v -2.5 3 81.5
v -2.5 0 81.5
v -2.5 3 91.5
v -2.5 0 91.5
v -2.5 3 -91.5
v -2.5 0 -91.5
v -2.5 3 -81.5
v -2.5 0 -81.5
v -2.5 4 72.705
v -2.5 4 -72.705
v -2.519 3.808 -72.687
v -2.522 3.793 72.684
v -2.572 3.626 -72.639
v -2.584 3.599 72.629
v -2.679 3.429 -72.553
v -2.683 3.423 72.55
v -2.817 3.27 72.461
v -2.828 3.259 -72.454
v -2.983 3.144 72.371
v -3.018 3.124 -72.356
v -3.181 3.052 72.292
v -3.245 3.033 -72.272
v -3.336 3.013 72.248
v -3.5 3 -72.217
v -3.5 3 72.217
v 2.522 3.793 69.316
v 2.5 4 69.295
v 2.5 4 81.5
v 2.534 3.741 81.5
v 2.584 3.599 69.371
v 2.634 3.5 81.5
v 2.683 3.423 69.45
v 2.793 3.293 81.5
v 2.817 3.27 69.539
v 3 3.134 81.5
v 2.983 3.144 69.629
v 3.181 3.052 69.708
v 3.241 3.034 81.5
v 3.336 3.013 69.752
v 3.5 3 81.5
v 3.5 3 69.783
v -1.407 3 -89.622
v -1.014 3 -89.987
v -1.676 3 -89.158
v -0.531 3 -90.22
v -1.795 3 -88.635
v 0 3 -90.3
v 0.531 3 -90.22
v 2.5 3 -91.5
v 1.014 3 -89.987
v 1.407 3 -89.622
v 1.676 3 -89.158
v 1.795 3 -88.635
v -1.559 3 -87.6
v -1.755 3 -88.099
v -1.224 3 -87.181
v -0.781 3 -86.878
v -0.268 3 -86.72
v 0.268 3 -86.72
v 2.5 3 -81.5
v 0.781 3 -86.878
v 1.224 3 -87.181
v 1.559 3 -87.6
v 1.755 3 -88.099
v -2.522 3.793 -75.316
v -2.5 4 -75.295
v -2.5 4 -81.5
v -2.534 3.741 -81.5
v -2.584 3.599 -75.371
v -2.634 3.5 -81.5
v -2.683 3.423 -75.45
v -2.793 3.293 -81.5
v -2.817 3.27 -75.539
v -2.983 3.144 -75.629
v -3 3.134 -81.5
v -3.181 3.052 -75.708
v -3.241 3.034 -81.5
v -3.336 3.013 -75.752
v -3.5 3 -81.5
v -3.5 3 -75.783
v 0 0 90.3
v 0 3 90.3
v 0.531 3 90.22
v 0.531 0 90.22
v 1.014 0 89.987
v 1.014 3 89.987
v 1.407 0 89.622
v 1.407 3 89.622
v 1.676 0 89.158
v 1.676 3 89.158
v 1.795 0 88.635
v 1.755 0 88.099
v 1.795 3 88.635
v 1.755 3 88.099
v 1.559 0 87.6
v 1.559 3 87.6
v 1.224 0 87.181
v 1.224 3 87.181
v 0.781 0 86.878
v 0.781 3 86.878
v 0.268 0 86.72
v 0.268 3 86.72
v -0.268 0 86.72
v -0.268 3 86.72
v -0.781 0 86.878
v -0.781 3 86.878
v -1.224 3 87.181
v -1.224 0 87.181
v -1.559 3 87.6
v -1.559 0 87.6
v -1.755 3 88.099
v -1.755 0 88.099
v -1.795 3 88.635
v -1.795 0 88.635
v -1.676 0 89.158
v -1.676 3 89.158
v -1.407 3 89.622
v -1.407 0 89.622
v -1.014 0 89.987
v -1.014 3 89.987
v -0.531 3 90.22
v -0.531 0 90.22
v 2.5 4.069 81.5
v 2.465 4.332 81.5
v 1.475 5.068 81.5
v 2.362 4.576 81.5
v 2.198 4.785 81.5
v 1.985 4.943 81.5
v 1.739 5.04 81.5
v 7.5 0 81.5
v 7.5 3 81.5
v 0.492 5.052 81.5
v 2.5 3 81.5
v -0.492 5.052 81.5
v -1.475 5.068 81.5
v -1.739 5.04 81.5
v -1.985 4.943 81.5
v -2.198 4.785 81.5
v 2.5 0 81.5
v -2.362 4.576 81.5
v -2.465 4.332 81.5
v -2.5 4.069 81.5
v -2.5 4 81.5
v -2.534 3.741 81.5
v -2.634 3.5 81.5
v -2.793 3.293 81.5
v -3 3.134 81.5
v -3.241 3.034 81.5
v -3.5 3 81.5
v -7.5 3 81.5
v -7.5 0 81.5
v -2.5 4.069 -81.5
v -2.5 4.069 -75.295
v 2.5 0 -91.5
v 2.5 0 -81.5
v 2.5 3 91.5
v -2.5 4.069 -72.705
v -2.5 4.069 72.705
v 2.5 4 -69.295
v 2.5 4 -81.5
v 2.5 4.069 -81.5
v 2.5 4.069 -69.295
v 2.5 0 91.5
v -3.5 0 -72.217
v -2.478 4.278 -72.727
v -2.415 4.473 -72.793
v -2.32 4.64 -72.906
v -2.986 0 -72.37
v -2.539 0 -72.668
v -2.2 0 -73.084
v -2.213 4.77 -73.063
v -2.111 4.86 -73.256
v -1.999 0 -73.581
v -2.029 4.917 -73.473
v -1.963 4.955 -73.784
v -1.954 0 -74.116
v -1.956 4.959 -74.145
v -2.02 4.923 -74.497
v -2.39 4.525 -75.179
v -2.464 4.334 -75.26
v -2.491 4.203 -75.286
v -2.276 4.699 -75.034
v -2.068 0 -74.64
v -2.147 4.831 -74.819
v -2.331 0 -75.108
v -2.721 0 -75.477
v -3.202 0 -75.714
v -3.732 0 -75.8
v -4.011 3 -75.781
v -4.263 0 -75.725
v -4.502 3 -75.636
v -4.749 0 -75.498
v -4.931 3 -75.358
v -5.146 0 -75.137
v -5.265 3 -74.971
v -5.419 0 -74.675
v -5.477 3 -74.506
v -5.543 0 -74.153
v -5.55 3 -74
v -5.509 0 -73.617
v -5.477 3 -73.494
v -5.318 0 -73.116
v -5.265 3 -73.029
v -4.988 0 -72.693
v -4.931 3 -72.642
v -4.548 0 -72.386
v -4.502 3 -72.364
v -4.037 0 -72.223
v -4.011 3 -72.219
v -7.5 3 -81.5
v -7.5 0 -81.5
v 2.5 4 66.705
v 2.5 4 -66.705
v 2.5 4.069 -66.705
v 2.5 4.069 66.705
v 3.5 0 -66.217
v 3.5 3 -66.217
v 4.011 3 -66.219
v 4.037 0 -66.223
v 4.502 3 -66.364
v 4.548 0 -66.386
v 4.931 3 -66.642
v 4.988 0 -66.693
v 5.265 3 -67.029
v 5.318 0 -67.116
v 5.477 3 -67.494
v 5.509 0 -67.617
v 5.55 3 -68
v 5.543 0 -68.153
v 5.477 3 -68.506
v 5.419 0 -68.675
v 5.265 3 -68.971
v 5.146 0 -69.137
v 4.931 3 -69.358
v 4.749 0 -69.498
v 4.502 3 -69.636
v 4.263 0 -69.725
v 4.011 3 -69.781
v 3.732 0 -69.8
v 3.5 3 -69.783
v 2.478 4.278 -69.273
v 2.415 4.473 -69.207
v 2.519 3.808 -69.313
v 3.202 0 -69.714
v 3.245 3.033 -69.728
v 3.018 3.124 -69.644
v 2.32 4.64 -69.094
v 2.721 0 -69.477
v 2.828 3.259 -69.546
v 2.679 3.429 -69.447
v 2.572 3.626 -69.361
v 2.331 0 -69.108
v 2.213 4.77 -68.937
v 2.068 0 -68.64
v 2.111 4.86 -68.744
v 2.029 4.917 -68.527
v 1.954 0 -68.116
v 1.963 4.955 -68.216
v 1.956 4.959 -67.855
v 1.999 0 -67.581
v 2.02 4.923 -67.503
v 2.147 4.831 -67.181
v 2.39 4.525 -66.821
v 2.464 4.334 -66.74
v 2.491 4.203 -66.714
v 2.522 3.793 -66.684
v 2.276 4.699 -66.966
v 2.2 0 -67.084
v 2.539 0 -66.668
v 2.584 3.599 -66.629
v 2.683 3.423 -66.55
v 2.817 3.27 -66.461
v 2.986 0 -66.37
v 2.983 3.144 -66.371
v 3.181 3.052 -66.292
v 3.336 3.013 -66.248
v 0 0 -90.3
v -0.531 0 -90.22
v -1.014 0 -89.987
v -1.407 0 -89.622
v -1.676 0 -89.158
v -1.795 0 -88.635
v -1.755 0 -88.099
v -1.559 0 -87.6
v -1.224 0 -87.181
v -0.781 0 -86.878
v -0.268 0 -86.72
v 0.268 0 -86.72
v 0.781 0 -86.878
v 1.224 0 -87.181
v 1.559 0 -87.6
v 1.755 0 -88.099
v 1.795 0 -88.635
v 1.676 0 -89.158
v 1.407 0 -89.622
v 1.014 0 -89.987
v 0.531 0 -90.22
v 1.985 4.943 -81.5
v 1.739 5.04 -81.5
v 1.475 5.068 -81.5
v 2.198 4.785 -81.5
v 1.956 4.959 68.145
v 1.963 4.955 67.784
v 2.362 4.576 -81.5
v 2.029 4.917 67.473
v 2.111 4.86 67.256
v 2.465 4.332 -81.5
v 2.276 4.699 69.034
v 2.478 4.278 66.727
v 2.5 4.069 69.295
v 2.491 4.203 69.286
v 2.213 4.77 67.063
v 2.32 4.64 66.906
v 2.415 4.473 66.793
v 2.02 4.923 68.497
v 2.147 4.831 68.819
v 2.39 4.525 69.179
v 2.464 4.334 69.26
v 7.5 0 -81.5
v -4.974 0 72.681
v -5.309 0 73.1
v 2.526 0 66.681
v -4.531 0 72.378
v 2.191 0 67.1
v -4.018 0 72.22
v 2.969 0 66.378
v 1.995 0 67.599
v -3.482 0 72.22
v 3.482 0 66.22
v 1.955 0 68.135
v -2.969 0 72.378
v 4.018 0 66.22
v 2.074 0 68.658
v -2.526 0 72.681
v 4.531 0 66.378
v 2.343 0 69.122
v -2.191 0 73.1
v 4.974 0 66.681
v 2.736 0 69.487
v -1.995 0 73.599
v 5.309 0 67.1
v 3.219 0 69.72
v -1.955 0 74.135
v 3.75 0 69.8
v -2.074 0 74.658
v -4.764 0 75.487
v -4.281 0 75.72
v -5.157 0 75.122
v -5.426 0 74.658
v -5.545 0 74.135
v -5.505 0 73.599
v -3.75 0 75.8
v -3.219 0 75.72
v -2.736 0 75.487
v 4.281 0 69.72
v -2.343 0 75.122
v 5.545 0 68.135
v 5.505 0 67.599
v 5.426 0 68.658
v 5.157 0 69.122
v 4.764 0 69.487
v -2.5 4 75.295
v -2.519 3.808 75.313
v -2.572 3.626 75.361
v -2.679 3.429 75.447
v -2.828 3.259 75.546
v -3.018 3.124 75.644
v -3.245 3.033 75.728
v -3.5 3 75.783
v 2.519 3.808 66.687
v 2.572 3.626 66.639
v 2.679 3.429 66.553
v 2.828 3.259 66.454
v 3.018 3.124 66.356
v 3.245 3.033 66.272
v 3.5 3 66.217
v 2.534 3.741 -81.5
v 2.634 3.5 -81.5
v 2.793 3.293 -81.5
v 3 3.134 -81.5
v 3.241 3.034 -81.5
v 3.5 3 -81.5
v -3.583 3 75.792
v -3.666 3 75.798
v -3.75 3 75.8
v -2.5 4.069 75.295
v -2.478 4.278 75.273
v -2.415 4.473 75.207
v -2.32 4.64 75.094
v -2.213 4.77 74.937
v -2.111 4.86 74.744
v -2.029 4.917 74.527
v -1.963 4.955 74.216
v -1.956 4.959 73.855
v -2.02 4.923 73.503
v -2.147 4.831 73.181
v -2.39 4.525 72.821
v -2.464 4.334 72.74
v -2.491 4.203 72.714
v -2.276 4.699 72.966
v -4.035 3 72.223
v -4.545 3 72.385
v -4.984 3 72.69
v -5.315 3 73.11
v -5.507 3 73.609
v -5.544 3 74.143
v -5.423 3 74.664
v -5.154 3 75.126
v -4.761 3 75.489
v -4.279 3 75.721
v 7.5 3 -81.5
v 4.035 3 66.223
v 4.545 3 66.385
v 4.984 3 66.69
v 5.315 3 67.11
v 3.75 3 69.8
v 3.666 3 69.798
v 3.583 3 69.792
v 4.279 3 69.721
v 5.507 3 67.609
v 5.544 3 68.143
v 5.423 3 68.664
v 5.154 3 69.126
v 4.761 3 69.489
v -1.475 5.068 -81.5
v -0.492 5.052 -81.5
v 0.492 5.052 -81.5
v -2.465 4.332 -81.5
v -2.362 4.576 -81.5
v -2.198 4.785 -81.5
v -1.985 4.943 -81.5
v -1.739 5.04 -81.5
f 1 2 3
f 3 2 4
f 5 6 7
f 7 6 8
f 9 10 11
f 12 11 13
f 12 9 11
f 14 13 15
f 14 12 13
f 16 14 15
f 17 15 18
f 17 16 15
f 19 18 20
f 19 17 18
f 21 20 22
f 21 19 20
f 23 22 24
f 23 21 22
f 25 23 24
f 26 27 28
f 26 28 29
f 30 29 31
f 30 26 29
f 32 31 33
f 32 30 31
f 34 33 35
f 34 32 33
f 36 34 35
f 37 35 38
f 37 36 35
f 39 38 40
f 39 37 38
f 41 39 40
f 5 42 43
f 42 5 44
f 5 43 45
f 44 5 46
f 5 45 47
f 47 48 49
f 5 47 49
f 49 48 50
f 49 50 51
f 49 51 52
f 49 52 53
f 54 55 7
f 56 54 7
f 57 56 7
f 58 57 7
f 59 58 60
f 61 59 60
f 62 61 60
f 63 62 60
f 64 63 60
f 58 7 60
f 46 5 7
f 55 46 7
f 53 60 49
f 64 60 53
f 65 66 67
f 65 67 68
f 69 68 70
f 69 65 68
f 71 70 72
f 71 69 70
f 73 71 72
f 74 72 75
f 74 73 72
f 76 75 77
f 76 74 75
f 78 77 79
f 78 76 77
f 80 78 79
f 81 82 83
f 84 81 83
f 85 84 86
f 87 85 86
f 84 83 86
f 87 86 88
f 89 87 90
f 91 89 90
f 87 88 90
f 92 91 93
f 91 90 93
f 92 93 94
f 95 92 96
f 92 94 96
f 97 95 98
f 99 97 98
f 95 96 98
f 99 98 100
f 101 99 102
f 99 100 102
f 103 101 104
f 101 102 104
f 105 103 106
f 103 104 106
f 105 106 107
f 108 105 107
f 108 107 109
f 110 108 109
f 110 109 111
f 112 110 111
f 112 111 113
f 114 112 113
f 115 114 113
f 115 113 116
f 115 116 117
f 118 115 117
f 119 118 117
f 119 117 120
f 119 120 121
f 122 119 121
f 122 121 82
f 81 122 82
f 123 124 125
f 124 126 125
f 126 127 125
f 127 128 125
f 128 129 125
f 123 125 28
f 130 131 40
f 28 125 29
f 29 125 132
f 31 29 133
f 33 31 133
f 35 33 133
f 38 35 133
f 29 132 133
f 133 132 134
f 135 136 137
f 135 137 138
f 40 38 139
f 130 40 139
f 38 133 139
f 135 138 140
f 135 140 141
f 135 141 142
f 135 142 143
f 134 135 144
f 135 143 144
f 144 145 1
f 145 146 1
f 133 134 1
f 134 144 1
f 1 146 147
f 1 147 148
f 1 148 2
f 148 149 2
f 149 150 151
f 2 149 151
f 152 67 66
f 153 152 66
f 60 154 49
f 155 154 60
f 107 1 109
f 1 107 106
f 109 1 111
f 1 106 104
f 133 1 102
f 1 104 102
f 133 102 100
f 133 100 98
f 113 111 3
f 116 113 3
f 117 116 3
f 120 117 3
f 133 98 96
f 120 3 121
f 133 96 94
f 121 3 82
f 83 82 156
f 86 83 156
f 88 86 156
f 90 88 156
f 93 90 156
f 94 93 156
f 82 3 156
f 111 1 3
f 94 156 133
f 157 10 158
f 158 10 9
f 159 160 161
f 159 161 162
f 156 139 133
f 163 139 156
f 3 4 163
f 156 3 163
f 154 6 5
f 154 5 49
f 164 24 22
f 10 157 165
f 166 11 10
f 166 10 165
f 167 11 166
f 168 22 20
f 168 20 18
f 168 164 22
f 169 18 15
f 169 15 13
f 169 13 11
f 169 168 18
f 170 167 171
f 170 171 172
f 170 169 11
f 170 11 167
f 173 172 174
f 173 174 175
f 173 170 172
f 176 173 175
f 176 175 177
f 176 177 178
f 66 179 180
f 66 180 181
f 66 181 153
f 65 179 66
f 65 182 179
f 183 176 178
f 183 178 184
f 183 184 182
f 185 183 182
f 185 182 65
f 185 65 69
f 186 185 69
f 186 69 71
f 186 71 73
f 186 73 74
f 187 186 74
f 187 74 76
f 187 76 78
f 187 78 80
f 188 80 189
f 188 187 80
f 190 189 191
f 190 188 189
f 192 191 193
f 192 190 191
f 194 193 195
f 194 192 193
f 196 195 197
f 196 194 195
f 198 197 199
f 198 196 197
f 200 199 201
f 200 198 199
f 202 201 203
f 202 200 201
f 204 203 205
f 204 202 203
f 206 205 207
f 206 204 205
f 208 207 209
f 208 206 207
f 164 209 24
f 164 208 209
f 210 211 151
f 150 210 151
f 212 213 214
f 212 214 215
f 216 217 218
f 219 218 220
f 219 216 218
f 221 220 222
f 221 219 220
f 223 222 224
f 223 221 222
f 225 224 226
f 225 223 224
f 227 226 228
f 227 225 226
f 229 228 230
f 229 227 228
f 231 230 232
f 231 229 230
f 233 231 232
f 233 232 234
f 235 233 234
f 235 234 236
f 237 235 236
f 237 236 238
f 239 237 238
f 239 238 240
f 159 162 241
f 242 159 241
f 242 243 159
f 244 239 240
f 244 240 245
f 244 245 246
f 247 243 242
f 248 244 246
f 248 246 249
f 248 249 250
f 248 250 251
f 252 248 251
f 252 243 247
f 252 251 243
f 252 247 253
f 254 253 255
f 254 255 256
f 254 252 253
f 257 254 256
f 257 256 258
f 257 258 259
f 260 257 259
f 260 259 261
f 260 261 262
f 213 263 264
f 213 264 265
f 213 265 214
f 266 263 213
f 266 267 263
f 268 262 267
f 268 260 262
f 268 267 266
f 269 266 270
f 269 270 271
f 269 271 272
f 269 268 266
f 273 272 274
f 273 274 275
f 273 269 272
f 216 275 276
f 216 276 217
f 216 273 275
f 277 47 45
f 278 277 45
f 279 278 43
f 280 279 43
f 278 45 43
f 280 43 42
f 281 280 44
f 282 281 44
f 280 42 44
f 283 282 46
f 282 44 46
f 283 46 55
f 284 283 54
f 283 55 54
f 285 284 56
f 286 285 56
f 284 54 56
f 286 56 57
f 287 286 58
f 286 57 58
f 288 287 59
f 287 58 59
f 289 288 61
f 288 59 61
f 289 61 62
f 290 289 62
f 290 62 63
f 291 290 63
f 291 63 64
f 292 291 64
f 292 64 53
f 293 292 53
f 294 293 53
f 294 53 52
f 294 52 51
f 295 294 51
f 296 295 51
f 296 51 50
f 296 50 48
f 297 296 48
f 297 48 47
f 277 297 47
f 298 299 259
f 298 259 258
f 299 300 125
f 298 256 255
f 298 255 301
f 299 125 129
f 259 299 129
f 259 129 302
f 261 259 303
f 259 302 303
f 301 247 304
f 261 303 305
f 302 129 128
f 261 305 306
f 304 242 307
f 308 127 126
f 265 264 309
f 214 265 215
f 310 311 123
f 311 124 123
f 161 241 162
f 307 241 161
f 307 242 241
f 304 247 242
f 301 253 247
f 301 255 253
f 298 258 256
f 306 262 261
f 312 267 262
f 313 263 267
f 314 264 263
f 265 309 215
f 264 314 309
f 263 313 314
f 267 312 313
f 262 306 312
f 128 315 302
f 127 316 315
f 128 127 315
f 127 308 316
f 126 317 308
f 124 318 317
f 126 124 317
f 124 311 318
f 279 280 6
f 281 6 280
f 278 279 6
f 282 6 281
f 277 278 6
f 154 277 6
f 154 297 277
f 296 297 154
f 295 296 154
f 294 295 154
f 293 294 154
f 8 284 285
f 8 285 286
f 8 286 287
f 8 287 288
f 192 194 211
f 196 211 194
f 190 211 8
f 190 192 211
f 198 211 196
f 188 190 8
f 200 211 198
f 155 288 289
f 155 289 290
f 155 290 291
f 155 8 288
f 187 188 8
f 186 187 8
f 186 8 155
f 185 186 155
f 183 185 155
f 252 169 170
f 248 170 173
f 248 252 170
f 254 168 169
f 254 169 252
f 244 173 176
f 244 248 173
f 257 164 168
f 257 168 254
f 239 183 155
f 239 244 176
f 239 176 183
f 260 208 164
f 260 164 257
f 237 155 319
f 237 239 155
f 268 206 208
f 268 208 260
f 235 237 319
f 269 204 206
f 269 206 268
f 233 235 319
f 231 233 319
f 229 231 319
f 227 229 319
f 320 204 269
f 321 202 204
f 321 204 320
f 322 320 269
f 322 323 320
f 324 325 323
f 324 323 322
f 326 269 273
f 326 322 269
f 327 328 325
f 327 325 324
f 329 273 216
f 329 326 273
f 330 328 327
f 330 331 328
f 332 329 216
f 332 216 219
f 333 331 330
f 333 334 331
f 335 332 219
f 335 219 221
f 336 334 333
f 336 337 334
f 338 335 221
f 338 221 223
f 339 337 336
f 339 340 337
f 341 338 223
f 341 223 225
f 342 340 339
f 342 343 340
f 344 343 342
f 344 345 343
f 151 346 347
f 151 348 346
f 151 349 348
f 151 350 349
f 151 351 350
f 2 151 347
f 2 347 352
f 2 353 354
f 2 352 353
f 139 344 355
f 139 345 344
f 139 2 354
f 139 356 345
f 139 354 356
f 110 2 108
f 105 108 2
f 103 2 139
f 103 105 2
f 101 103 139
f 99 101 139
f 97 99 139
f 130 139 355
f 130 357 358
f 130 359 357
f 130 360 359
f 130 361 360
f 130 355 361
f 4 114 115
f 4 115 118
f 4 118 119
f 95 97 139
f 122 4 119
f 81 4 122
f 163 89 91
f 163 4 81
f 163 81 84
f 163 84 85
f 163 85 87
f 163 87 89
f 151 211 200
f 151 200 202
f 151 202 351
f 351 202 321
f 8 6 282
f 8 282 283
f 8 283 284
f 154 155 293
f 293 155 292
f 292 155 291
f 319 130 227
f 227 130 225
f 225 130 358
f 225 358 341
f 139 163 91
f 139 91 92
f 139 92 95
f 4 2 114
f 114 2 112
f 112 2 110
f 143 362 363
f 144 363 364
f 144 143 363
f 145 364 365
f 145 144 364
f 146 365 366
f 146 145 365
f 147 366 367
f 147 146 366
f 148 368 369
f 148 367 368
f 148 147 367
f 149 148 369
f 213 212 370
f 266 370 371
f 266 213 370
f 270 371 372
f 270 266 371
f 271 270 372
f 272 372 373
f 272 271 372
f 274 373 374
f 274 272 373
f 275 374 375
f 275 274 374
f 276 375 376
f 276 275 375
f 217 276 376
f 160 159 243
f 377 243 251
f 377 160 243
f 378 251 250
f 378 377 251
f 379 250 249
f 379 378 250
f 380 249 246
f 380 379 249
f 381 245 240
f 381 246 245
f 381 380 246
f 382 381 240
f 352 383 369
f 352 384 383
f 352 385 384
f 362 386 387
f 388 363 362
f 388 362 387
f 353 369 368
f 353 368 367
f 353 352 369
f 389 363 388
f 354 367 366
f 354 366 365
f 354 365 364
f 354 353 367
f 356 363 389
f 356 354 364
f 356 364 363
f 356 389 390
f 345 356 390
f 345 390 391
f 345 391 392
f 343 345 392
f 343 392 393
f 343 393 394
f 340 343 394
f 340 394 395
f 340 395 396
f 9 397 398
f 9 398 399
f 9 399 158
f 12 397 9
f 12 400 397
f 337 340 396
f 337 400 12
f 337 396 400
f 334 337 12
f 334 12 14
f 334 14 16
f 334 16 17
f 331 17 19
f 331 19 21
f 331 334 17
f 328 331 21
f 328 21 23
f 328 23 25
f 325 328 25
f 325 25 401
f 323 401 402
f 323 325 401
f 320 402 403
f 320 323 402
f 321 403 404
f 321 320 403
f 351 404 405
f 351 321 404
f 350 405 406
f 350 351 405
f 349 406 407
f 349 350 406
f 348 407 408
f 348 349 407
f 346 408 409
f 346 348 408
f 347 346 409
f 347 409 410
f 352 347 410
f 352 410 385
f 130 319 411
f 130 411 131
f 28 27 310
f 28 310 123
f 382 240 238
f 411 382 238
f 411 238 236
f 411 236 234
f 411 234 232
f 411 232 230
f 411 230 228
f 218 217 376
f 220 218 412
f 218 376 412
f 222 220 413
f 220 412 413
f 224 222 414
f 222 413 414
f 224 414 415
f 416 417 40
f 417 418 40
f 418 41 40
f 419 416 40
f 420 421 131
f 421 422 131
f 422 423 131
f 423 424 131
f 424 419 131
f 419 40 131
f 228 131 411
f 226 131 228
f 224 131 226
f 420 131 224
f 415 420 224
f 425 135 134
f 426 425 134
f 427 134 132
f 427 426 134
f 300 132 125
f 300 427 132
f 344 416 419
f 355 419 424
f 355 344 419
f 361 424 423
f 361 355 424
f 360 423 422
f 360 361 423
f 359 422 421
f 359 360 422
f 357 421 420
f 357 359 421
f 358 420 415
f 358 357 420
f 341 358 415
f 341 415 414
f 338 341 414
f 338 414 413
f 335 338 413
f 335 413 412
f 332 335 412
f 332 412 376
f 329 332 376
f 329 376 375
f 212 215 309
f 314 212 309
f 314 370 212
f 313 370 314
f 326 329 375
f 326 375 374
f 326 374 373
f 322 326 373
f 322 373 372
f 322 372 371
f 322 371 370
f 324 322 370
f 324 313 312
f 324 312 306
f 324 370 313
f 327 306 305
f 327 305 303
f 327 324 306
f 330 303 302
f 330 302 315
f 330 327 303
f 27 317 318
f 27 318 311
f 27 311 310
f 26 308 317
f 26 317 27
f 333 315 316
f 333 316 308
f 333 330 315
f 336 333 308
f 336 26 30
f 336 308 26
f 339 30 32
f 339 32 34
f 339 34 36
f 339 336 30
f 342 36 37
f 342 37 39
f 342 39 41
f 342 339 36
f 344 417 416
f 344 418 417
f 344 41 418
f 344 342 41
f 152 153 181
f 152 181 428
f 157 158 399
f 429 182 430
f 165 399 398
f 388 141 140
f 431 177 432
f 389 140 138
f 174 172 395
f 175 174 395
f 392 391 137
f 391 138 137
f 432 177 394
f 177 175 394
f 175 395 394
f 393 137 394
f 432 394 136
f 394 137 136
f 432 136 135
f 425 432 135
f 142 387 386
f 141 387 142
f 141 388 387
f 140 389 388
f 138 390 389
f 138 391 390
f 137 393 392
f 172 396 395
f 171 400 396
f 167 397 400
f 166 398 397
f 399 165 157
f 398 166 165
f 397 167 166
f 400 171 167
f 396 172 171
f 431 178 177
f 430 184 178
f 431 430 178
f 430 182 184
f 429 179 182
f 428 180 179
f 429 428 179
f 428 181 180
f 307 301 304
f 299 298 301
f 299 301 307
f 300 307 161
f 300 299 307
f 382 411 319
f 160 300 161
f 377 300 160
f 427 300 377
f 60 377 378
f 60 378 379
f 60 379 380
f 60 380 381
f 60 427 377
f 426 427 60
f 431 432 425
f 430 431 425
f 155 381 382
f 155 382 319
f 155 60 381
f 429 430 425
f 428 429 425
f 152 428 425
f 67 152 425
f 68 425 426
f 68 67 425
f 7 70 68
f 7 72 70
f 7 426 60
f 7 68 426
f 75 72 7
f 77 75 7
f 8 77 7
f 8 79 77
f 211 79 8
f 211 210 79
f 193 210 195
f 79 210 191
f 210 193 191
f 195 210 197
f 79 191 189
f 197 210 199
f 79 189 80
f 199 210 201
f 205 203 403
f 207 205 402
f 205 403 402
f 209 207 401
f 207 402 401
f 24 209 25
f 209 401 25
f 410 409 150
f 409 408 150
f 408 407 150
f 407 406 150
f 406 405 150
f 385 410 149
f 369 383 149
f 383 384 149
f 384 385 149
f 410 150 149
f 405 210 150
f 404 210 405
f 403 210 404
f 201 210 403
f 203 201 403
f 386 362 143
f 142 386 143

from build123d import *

# Parameters (mm, degrees)
SKETCH1_W               = 5
SKETCH1_H               = 163
BOSS_EXTRUDE1_DEPTH     = 3
BOSS_EXTRUDE2_DEPTH     = 81.5
BOSS_EXTRUDE3_START     = 81.5
BOSS_EXTRUDE3_DEPTH     = 81.5
SKETCH8_W               = 5
SKETCH8_H               = 10
BOSS_EXTRUDE4_DEPTH     = 3
SKETCH6_R               = 1.8
CUT_EXTRUDE1_DEPTH      = 92.58329542
SKETCH9_W               = 15
SKETCH9_H               = 163
BOSS_EXTRUDE5_DEPTH     = 3
FILLET1_R               = 1
CUT_EXTRUDE2_DEPTH      = 92.855865354
CUT_EXTRUDE2_DEPTH_BACK = 92.855865354
SKETCH10_R              = 1.8


with BuildPart() as part:
    # Sketch1 → Boss-Extrude1 (new body)
    with BuildSketch(Plane(origin=(0, 0, 0), x_dir=(1, 0, 0), z_dir=(0, 1, 0))):
        Rectangle(SKETCH1_W, SKETCH1_H)
    extrude(amount=BOSS_EXTRUDE1_DEPTH)

    # Sketch3 → Boss-Extrude2 (add)
    with BuildSketch(Plane.XY):
        with BuildLine():
            Line((-2.5, 3), (-2.5, 5.102989898))
            ThreePointArc((-2.5, 5.102989898), (0, 5.05), (2.5, 5.102989898))
            Line((2.5, 5.102989898), (2.5, 3))
            Line((2.5, 3), (2.5, 0))
            Line((2.5, 0), (-2.5, 0))
            Line((-2.5, 0), (-2.5, 3))
        make_face()
    extrude(amount=BOSS_EXTRUDE2_DEPTH)

    # Sketch7 → Boss-Extrude3 (add)
    with BuildSketch(Plane(origin=(0, 0, 0), x_dir=(-1, 0, 0), z_dir=(0, 0, -1)).offset(BOSS_EXTRUDE3_START)):
        with BuildLine():
            Line((-2.5, 5.102989898), (-2.5, 3))
            Line((-2.5, 3), (2.5, 3))
            Line((2.5, 3), (2.5, 5.102989898))
            ThreePointArc((2.5, 5.102989898), (0, 5.05), (-2.5, 5.102989898))
        make_face()
    extrude(amount=-BOSS_EXTRUDE3_DEPTH)

    # Sketch8 → Boss-Extrude4 (add)
    with BuildSketch(Plane.XZ):
        with Locations((0, 86.5)):
            Rectangle(SKETCH8_W, SKETCH8_H)
        with Locations((0, -86.5)):
            Rectangle(SKETCH8_W, SKETCH8_H)
    extrude(amount=-BOSS_EXTRUDE4_DEPTH)

    # Sketch6 → Cut-Extrude1 (cut, through all)
    with BuildSketch(Plane(origin=(0, 3, 0), x_dir=(1, 0, 0), z_dir=(0, 1, 0))):
        with Locations(Location((0, -88.5, 0), (0, 0, 270))):
            Circle(SKETCH6_R)
        with Locations(Location((0, 88.5, 0), (0, 0, 90))):
            Circle(SKETCH6_R)
    extrude(amount=-CUT_EXTRUDE1_DEPTH, mode=Mode.SUBTRACT)

    # Sketch9 → Boss-Extrude5 (add)
    with BuildSketch(Plane.XZ):
        Rectangle(SKETCH9_W, SKETCH9_H)
    extrude(amount=-BOSS_EXTRUDE5_DEPTH)

    # Fillet1
    # the kernel refuses this fillet: 1 mm, written as the material it adds along each edge
    with BuildSketch(Plane(origin=(2.5, 3, -81.5), x_dir=(0, 1, 0), z_dir=(0, 0, 1)), Plane(origin=(-2.5, 3, 81.5), x_dir=(0, 1, 0), z_dir=(0, 0, -1))) as fillet1_piece_1:
        with BuildLine():
            CenterArc((FILLET1_R, -FILLET1_R), FILLET1_R, 90, 90)
            Line((0, -FILLET1_R), (0, 0))
            Line((0, 0), (FILLET1_R, 0))
        make_face()
    extrude(amount=163)
    # the kernel refuses this fillet: 1 mm, written as the material it takes off along each edge
    with BuildSketch(Plane(origin=(-2.5, 5.102989898, 84.085592418), x_dir=(0, -1, 0), z_dir=(0, 0, -1))) as fillet1_2_piece_1:
        with BuildLine():
            CenterArc((1.034236967, -1), FILLET1_R, 90, 91.432543738)
            ThreePointArc((0.034549516, -1.025), (0.019501965, -0.512424928), (0, 0))
            Line((0, 0), (1.034236967, 0))
        make_face()
    extrude(amount=168.171184836, mode=Mode.SUBTRACT)
    with BuildSketch(Plane(origin=(2.5, 5.102989898, 84.085592418), x_dir=(0, -1, 0), z_dir=(0, 0, -1))) as fillet1_2_piece_2:
        with BuildLine():
            CenterArc((1.034236967, 1), FILLET1_R, 178.567456262, 91.432543738)
            ThreePointArc((0.034549516, 1.025), (0.019501965, 0.512424928), (0, 0))
            Line((0, 0), (1.034236967, 0))
        make_face()
    extrude(amount=168.171184836, mode=Mode.SUBTRACT)

    # Sketch10 → Cut-Extrude2 (cut, two sides: drawn at the far end of the back side and taken through both)
    with BuildSketch(Plane(origin=(0, 3, 0), x_dir=(1, 0, 0), z_dir=(0, 1, 0)).offset(-CUT_EXTRUDE2_DEPTH_BACK)):
        with Locations(Location((-3.75, -74, 0), (0, 0, 270))):
            Circle(SKETCH10_R)
        with Locations(Location((3.75, -68, 0), (0, 0, 270))):
            Circle(SKETCH10_R)
        with Locations(Location((3.75, 68, 0), (0, 0, 262.016443854))):
            Circle(SKETCH10_R)
        with Locations(Location((-3.75, 74, 0), (0, 0, 277.983556156))):
            Circle(SKETCH10_R)
    extrude(amount=CUT_EXTRUDE2_DEPTH + CUT_EXTRUDE2_DEPTH_BACK, mode=Mode.SUBTRACT)


solid = part.part
